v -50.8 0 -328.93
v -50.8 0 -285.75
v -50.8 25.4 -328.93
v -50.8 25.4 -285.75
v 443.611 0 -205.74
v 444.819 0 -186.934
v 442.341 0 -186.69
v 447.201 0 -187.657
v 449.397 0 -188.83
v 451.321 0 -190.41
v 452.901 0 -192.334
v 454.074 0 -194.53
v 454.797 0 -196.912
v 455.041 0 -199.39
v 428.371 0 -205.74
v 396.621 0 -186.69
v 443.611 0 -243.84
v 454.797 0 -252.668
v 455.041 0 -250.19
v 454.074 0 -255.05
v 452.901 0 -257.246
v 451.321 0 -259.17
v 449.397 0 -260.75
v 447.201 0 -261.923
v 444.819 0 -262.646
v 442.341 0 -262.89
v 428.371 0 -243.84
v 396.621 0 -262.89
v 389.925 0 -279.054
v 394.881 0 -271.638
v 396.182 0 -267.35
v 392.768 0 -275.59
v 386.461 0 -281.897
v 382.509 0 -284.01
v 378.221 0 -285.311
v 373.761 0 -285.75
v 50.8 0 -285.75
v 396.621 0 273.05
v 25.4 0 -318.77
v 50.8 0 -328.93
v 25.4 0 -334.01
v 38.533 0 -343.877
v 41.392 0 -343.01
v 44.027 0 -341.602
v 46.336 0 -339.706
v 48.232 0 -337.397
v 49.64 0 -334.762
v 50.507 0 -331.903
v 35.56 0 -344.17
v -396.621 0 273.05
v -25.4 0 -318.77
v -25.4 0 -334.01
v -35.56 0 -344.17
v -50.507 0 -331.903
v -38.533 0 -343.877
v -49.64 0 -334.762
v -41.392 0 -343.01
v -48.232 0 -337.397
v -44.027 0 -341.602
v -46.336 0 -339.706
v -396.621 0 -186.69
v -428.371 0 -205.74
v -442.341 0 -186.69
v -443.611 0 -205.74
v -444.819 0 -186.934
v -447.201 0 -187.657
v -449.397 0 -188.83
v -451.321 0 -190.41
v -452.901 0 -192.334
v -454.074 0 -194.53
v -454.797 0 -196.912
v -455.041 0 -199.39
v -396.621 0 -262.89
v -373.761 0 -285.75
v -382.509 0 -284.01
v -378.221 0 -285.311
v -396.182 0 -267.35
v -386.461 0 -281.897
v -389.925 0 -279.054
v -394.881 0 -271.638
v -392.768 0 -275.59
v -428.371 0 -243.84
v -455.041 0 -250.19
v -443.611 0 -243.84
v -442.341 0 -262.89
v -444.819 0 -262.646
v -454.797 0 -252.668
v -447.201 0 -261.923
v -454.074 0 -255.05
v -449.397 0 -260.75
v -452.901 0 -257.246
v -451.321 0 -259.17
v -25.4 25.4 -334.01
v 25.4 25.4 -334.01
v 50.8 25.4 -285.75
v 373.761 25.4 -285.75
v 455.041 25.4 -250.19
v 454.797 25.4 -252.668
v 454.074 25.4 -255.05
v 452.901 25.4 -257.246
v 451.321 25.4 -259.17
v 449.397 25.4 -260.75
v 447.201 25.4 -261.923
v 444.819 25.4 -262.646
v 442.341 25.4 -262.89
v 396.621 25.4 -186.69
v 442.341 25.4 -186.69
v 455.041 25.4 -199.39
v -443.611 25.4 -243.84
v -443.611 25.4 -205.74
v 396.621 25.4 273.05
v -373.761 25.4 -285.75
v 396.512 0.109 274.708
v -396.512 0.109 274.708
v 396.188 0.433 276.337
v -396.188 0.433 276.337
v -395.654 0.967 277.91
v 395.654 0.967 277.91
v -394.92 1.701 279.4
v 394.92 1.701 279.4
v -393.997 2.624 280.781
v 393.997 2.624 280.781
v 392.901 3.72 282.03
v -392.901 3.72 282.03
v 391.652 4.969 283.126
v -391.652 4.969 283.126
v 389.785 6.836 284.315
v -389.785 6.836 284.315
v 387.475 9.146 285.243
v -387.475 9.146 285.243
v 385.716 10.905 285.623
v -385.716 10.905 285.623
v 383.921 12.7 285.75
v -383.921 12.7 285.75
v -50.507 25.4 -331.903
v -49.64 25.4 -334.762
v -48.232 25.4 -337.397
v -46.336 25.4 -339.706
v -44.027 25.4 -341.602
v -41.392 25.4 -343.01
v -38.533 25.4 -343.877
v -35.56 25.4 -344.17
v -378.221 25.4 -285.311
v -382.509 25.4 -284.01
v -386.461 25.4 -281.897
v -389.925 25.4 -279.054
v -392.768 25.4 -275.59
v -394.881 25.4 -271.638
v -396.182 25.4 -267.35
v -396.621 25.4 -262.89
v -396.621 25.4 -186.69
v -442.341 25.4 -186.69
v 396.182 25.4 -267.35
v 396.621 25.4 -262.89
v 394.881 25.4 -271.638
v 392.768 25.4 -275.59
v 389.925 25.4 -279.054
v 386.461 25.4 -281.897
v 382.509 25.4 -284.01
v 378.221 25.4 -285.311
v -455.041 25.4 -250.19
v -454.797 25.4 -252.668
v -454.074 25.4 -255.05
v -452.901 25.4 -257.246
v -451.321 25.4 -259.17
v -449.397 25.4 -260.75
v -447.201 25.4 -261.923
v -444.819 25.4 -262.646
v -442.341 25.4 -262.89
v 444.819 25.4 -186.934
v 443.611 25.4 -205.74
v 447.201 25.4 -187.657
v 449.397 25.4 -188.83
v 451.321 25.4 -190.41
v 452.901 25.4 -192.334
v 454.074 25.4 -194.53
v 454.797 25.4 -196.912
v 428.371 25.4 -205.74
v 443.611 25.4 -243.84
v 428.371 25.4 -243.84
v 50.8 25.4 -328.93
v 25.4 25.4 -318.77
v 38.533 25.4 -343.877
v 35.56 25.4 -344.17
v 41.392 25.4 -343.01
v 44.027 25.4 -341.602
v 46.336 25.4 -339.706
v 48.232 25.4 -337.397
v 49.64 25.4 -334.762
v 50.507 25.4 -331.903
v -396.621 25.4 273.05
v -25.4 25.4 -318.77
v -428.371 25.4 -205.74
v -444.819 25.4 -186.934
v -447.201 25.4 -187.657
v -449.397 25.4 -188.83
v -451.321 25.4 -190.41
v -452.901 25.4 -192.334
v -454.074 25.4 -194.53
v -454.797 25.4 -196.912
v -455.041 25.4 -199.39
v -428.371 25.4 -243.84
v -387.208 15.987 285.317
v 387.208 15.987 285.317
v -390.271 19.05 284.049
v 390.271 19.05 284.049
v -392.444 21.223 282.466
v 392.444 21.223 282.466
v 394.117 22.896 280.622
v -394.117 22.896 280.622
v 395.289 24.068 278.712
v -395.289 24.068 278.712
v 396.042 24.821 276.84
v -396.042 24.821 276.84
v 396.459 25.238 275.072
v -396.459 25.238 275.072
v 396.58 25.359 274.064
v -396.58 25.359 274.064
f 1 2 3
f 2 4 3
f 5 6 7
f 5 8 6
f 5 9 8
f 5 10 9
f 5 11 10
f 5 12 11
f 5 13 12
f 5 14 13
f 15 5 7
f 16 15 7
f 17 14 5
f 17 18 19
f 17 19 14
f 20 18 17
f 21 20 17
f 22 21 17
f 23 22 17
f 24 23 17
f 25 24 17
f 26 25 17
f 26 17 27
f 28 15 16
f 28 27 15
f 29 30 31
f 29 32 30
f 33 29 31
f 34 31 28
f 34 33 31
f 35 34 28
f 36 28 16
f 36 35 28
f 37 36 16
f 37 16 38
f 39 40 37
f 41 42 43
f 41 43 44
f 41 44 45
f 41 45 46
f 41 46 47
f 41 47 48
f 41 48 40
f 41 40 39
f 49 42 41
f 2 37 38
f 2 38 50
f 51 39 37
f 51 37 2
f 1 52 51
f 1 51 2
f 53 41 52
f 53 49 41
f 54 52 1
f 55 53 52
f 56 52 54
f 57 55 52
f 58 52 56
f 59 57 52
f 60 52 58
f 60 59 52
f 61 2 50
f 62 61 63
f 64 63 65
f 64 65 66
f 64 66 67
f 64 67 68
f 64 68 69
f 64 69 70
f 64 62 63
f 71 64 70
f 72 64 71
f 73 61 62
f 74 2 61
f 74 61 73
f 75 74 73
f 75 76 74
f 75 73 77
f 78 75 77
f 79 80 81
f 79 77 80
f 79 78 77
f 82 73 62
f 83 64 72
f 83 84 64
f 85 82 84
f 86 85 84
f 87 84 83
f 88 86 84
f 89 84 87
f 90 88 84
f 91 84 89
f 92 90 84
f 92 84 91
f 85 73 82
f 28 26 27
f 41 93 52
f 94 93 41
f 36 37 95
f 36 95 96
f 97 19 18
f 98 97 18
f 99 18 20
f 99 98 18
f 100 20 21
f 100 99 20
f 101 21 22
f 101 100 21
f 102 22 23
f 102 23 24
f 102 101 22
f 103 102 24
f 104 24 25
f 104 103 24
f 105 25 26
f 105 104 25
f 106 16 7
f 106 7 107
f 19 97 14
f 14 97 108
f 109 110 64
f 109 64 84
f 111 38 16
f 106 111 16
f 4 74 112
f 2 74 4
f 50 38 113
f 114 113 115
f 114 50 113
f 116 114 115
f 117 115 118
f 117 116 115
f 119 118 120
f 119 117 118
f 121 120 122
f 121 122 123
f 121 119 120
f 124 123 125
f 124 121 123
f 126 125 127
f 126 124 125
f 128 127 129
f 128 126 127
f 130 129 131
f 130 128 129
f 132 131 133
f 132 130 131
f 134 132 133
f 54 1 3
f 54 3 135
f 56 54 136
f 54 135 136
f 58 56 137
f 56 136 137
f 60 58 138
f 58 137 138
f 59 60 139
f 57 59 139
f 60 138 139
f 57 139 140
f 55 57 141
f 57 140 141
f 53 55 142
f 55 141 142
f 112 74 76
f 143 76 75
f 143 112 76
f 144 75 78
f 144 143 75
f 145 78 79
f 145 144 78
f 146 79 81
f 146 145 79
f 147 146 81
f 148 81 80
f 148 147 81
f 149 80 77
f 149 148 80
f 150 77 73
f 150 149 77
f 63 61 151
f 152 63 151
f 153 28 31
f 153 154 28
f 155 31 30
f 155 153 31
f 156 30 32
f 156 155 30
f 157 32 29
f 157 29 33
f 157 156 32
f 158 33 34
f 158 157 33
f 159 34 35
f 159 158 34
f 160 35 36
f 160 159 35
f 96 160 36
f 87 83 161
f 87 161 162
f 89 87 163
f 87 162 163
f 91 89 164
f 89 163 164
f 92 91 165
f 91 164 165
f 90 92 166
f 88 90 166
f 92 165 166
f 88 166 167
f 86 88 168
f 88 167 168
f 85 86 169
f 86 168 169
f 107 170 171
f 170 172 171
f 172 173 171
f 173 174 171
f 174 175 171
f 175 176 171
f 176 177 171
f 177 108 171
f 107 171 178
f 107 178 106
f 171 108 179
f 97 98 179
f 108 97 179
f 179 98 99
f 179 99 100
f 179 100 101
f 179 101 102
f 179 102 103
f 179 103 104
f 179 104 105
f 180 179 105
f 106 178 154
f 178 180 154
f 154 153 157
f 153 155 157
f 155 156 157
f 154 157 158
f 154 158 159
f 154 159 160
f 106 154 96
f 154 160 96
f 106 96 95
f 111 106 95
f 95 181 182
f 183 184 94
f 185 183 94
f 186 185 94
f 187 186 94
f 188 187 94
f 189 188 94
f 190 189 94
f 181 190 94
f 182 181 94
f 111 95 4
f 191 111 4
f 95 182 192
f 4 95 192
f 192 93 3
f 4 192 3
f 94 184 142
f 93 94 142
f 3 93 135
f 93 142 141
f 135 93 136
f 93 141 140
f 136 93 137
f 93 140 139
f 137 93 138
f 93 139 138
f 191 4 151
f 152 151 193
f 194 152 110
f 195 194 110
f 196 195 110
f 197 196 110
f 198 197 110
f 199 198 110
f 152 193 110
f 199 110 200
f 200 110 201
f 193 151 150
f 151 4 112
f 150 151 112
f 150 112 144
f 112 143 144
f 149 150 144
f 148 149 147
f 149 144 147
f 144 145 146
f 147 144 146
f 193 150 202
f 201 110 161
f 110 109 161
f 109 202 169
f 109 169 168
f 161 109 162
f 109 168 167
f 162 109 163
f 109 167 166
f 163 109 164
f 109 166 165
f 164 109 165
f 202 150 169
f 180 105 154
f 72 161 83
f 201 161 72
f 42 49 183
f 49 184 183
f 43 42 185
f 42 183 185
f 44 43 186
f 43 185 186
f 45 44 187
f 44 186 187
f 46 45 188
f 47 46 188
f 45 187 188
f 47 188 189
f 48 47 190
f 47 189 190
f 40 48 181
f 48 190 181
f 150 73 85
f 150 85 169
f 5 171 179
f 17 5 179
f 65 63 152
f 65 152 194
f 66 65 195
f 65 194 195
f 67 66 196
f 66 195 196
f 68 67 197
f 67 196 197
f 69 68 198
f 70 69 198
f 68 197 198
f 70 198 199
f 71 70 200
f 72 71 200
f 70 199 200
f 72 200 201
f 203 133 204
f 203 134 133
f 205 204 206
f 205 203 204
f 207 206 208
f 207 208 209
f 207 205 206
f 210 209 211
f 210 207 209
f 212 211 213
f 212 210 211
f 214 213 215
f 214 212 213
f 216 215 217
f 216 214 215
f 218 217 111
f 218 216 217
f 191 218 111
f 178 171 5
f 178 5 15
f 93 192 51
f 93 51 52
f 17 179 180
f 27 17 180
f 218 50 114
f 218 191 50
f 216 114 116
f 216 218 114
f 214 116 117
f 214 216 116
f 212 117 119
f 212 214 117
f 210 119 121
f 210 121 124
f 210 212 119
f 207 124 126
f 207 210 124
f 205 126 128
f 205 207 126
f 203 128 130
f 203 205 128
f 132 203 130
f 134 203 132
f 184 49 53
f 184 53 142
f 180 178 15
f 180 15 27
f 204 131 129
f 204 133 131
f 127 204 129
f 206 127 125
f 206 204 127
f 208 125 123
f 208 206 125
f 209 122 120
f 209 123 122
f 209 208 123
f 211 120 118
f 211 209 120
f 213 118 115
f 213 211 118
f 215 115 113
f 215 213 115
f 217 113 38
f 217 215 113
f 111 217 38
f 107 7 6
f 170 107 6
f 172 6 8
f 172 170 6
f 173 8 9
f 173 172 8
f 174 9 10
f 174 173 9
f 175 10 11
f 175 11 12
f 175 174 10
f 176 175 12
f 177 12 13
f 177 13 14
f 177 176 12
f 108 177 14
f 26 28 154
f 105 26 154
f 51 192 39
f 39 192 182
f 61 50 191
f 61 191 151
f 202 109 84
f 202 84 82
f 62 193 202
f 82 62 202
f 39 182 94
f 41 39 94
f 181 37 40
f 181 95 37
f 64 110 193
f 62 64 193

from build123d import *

# Parameters (mm, degrees)
SKETCH1_W            = 793.242
SKETCH1_H            = 571.5
BOSS_EXTRUDE1_DEPTH  = 25.4
FILLET1_R            = 17.78
SKETCH2_W            = 76.2
SKETCH2_H            = 25.4
BOSS_EXTRUDE2_DEPTH  = 58.42
FILLET2_R            = 12.7
SKETCH3_W            = 15.24
SKETCH3_H            = 38.1
CUT_EXTRUDE1_DEPTH   = 538.922423943
FILLET2_OF_MIRROR2_R = 12.7
SKETCH4_W            = 58.42
SKETCH4_H            = 25.4
BOSS_EXTRUDE3_DEPTH  = 50.8
FILLET3_R            = 22.86
FILLET4_R            = 22.86
SKETCH5_W            = 50.8
SKETCH5_H            = 15.24
CUT_EXTRUDE2_DEPTH   = 572.104596883
FILLET7_R            = 15.24
FILLET8_R            = 12.7


with BuildPart() as part:
    # Sketch1 → Boss-Extrude1 (new body)
    with BuildSketch(Plane(origin=(0, 0, 0), x_dir=(1, 0, 0), z_dir=(0, 1, 0))):
        Rectangle(SKETCH1_W, SKETCH1_H)
    boss_extrude1 = extrude(amount=BOSS_EXTRUDE1_DEPTH)

    # Fillet1
    fillet1_edges = [part.edges().sort_by_distance(p)[0] for p in [
        (0, 25.4, 285.75),
        (396.621, 12.7, 285.75),
        (-396.621, 12.7, 285.75),
        (-396.621, 12.7, -285.75),
        (396.621, 12.7, -285.75),
    ]]
    fillet(fillet1_edges, radius=FILLET1_R)

    # Sketch2 → Boss-Extrude2 (add)
    with BuildSketch(Plane.ZY.offset(396.621)):
        with Locations((-224.79, 12.7)):
            Rectangle(SKETCH2_W, SKETCH2_H)
    boss_extrude2 = extrude(amount=BOSS_EXTRUDE2_DEPTH)

    # Fillet2
    fillet2_edges = [part.edges().sort_by_distance(p)[0] for p in [
        (-455.041, 12.7, -262.89),
        (-455.041, 12.7, -186.69),
    ]]
    fillet(fillet2_edges, radius=FILLET2_R)

    # Sketch3 → Cut-Extrude1 (cut, through all)
    with BuildSketch(Plane(origin=(0, 25.4, 0), x_dir=(1, 0, 0), z_dir=(0, 1, 0))):
        with Locations((-435.991, 224.79)):
            Rectangle(SKETCH3_W, SKETCH3_H)
    cut_extrude1 = extrude(amount=-CUT_EXTRUDE1_DEPTH, mode=Mode.SUBTRACT)

    # Mirror2: Boss-Extrude1, Boss-Extrude2, Cut-Extrude1 across plane
    add(boss_extrude1.mirror(Plane(origin=(0, 0, 0), x_dir=(0, 0, 1), z_dir=(1, 0, 0))))
    add(boss_extrude2.mirror(Plane(origin=(0, 0, 0), x_dir=(0, 0, 1), z_dir=(1, 0, 0))))
    add(cut_extrude1.mirror(Plane(origin=(0, 0, 0), x_dir=(0, 0, 1), z_dir=(1, 0, 0))), mode=Mode.SUBTRACT)

    # Fillet2 of Mirror2
    fillet2_of_mirror2_edges = [part.edges().sort_by_distance(p)[0] for p in [
        (455.041, 12.7, -262.89),
        (455.041, 12.7, -186.69),
    ]]
    fillet(fillet2_of_mirror2_edges, radius=FILLET2_OF_MIRROR2_R)

    # Sketch4 → Boss-Extrude3 (add, symmetric)
    with BuildSketch(Plane(origin=(0, 0, 0), x_dir=(0, 0, -1), z_dir=(1, 0, 0))):
        with Locations((314.96, 12.7)):
            Rectangle(SKETCH4_W, SKETCH4_H)
    extrude(amount=BOSS_EXTRUDE3_DEPTH, both=True)

    # Fillet3
    fillet3_edges = [part.edges().sort_by_distance(p)[0] for p in [
        (396.621, 12.7, -285.75),
    ]]
    fillet(fillet3_edges, radius=FILLET3_R - 0.0001)  # a hair under: the kernel refuses the full size

    # Fillet4
    fillet4_edges = [part.edges().sort_by_distance(p)[0] for p in [
        (-396.621, 12.7, -285.75),
    ]]
    fillet(fillet4_edges, radius=FILLET4_R - 0.0001)  # a hair under: the kernel refuses the full size

    # Sketch5 → Cut-Extrude2 (cut, through all)
    with BuildSketch(Plane(origin=(0, 25.4, 0), x_dir=(1, 0, 0), z_dir=(0, 1, 0))):
        with Locations((0, 326.39)):
            Rectangle(SKETCH5_W, SKETCH5_H)
    extrude(amount=-CUT_EXTRUDE2_DEPTH, mode=Mode.SUBTRACT)

    # Fillet7
    fillet7_edges = [part.edges().sort_by_distance(p)[0] for p in [
        (-50.8, 12.7, -344.17),
        (50.8, 12.7, -344.17),
    ]]
    fillet(fillet7_edges, radius=FILLET7_R)

    # Fillet8
    fillet8_edges = [part.edges().sort_by_distance(p)[0] for p in [
        (0, 0, 285.75),
        (0, 25.4, 285.75),
        (-396.621, 12.7, 285.75),
        (396.621, 12.7, 285.75),
    ]]
    fillet(fillet8_edges, radius=FILLET8_R - 0.0001)  # a hair under: the kernel refuses the full size


solid = part.part
